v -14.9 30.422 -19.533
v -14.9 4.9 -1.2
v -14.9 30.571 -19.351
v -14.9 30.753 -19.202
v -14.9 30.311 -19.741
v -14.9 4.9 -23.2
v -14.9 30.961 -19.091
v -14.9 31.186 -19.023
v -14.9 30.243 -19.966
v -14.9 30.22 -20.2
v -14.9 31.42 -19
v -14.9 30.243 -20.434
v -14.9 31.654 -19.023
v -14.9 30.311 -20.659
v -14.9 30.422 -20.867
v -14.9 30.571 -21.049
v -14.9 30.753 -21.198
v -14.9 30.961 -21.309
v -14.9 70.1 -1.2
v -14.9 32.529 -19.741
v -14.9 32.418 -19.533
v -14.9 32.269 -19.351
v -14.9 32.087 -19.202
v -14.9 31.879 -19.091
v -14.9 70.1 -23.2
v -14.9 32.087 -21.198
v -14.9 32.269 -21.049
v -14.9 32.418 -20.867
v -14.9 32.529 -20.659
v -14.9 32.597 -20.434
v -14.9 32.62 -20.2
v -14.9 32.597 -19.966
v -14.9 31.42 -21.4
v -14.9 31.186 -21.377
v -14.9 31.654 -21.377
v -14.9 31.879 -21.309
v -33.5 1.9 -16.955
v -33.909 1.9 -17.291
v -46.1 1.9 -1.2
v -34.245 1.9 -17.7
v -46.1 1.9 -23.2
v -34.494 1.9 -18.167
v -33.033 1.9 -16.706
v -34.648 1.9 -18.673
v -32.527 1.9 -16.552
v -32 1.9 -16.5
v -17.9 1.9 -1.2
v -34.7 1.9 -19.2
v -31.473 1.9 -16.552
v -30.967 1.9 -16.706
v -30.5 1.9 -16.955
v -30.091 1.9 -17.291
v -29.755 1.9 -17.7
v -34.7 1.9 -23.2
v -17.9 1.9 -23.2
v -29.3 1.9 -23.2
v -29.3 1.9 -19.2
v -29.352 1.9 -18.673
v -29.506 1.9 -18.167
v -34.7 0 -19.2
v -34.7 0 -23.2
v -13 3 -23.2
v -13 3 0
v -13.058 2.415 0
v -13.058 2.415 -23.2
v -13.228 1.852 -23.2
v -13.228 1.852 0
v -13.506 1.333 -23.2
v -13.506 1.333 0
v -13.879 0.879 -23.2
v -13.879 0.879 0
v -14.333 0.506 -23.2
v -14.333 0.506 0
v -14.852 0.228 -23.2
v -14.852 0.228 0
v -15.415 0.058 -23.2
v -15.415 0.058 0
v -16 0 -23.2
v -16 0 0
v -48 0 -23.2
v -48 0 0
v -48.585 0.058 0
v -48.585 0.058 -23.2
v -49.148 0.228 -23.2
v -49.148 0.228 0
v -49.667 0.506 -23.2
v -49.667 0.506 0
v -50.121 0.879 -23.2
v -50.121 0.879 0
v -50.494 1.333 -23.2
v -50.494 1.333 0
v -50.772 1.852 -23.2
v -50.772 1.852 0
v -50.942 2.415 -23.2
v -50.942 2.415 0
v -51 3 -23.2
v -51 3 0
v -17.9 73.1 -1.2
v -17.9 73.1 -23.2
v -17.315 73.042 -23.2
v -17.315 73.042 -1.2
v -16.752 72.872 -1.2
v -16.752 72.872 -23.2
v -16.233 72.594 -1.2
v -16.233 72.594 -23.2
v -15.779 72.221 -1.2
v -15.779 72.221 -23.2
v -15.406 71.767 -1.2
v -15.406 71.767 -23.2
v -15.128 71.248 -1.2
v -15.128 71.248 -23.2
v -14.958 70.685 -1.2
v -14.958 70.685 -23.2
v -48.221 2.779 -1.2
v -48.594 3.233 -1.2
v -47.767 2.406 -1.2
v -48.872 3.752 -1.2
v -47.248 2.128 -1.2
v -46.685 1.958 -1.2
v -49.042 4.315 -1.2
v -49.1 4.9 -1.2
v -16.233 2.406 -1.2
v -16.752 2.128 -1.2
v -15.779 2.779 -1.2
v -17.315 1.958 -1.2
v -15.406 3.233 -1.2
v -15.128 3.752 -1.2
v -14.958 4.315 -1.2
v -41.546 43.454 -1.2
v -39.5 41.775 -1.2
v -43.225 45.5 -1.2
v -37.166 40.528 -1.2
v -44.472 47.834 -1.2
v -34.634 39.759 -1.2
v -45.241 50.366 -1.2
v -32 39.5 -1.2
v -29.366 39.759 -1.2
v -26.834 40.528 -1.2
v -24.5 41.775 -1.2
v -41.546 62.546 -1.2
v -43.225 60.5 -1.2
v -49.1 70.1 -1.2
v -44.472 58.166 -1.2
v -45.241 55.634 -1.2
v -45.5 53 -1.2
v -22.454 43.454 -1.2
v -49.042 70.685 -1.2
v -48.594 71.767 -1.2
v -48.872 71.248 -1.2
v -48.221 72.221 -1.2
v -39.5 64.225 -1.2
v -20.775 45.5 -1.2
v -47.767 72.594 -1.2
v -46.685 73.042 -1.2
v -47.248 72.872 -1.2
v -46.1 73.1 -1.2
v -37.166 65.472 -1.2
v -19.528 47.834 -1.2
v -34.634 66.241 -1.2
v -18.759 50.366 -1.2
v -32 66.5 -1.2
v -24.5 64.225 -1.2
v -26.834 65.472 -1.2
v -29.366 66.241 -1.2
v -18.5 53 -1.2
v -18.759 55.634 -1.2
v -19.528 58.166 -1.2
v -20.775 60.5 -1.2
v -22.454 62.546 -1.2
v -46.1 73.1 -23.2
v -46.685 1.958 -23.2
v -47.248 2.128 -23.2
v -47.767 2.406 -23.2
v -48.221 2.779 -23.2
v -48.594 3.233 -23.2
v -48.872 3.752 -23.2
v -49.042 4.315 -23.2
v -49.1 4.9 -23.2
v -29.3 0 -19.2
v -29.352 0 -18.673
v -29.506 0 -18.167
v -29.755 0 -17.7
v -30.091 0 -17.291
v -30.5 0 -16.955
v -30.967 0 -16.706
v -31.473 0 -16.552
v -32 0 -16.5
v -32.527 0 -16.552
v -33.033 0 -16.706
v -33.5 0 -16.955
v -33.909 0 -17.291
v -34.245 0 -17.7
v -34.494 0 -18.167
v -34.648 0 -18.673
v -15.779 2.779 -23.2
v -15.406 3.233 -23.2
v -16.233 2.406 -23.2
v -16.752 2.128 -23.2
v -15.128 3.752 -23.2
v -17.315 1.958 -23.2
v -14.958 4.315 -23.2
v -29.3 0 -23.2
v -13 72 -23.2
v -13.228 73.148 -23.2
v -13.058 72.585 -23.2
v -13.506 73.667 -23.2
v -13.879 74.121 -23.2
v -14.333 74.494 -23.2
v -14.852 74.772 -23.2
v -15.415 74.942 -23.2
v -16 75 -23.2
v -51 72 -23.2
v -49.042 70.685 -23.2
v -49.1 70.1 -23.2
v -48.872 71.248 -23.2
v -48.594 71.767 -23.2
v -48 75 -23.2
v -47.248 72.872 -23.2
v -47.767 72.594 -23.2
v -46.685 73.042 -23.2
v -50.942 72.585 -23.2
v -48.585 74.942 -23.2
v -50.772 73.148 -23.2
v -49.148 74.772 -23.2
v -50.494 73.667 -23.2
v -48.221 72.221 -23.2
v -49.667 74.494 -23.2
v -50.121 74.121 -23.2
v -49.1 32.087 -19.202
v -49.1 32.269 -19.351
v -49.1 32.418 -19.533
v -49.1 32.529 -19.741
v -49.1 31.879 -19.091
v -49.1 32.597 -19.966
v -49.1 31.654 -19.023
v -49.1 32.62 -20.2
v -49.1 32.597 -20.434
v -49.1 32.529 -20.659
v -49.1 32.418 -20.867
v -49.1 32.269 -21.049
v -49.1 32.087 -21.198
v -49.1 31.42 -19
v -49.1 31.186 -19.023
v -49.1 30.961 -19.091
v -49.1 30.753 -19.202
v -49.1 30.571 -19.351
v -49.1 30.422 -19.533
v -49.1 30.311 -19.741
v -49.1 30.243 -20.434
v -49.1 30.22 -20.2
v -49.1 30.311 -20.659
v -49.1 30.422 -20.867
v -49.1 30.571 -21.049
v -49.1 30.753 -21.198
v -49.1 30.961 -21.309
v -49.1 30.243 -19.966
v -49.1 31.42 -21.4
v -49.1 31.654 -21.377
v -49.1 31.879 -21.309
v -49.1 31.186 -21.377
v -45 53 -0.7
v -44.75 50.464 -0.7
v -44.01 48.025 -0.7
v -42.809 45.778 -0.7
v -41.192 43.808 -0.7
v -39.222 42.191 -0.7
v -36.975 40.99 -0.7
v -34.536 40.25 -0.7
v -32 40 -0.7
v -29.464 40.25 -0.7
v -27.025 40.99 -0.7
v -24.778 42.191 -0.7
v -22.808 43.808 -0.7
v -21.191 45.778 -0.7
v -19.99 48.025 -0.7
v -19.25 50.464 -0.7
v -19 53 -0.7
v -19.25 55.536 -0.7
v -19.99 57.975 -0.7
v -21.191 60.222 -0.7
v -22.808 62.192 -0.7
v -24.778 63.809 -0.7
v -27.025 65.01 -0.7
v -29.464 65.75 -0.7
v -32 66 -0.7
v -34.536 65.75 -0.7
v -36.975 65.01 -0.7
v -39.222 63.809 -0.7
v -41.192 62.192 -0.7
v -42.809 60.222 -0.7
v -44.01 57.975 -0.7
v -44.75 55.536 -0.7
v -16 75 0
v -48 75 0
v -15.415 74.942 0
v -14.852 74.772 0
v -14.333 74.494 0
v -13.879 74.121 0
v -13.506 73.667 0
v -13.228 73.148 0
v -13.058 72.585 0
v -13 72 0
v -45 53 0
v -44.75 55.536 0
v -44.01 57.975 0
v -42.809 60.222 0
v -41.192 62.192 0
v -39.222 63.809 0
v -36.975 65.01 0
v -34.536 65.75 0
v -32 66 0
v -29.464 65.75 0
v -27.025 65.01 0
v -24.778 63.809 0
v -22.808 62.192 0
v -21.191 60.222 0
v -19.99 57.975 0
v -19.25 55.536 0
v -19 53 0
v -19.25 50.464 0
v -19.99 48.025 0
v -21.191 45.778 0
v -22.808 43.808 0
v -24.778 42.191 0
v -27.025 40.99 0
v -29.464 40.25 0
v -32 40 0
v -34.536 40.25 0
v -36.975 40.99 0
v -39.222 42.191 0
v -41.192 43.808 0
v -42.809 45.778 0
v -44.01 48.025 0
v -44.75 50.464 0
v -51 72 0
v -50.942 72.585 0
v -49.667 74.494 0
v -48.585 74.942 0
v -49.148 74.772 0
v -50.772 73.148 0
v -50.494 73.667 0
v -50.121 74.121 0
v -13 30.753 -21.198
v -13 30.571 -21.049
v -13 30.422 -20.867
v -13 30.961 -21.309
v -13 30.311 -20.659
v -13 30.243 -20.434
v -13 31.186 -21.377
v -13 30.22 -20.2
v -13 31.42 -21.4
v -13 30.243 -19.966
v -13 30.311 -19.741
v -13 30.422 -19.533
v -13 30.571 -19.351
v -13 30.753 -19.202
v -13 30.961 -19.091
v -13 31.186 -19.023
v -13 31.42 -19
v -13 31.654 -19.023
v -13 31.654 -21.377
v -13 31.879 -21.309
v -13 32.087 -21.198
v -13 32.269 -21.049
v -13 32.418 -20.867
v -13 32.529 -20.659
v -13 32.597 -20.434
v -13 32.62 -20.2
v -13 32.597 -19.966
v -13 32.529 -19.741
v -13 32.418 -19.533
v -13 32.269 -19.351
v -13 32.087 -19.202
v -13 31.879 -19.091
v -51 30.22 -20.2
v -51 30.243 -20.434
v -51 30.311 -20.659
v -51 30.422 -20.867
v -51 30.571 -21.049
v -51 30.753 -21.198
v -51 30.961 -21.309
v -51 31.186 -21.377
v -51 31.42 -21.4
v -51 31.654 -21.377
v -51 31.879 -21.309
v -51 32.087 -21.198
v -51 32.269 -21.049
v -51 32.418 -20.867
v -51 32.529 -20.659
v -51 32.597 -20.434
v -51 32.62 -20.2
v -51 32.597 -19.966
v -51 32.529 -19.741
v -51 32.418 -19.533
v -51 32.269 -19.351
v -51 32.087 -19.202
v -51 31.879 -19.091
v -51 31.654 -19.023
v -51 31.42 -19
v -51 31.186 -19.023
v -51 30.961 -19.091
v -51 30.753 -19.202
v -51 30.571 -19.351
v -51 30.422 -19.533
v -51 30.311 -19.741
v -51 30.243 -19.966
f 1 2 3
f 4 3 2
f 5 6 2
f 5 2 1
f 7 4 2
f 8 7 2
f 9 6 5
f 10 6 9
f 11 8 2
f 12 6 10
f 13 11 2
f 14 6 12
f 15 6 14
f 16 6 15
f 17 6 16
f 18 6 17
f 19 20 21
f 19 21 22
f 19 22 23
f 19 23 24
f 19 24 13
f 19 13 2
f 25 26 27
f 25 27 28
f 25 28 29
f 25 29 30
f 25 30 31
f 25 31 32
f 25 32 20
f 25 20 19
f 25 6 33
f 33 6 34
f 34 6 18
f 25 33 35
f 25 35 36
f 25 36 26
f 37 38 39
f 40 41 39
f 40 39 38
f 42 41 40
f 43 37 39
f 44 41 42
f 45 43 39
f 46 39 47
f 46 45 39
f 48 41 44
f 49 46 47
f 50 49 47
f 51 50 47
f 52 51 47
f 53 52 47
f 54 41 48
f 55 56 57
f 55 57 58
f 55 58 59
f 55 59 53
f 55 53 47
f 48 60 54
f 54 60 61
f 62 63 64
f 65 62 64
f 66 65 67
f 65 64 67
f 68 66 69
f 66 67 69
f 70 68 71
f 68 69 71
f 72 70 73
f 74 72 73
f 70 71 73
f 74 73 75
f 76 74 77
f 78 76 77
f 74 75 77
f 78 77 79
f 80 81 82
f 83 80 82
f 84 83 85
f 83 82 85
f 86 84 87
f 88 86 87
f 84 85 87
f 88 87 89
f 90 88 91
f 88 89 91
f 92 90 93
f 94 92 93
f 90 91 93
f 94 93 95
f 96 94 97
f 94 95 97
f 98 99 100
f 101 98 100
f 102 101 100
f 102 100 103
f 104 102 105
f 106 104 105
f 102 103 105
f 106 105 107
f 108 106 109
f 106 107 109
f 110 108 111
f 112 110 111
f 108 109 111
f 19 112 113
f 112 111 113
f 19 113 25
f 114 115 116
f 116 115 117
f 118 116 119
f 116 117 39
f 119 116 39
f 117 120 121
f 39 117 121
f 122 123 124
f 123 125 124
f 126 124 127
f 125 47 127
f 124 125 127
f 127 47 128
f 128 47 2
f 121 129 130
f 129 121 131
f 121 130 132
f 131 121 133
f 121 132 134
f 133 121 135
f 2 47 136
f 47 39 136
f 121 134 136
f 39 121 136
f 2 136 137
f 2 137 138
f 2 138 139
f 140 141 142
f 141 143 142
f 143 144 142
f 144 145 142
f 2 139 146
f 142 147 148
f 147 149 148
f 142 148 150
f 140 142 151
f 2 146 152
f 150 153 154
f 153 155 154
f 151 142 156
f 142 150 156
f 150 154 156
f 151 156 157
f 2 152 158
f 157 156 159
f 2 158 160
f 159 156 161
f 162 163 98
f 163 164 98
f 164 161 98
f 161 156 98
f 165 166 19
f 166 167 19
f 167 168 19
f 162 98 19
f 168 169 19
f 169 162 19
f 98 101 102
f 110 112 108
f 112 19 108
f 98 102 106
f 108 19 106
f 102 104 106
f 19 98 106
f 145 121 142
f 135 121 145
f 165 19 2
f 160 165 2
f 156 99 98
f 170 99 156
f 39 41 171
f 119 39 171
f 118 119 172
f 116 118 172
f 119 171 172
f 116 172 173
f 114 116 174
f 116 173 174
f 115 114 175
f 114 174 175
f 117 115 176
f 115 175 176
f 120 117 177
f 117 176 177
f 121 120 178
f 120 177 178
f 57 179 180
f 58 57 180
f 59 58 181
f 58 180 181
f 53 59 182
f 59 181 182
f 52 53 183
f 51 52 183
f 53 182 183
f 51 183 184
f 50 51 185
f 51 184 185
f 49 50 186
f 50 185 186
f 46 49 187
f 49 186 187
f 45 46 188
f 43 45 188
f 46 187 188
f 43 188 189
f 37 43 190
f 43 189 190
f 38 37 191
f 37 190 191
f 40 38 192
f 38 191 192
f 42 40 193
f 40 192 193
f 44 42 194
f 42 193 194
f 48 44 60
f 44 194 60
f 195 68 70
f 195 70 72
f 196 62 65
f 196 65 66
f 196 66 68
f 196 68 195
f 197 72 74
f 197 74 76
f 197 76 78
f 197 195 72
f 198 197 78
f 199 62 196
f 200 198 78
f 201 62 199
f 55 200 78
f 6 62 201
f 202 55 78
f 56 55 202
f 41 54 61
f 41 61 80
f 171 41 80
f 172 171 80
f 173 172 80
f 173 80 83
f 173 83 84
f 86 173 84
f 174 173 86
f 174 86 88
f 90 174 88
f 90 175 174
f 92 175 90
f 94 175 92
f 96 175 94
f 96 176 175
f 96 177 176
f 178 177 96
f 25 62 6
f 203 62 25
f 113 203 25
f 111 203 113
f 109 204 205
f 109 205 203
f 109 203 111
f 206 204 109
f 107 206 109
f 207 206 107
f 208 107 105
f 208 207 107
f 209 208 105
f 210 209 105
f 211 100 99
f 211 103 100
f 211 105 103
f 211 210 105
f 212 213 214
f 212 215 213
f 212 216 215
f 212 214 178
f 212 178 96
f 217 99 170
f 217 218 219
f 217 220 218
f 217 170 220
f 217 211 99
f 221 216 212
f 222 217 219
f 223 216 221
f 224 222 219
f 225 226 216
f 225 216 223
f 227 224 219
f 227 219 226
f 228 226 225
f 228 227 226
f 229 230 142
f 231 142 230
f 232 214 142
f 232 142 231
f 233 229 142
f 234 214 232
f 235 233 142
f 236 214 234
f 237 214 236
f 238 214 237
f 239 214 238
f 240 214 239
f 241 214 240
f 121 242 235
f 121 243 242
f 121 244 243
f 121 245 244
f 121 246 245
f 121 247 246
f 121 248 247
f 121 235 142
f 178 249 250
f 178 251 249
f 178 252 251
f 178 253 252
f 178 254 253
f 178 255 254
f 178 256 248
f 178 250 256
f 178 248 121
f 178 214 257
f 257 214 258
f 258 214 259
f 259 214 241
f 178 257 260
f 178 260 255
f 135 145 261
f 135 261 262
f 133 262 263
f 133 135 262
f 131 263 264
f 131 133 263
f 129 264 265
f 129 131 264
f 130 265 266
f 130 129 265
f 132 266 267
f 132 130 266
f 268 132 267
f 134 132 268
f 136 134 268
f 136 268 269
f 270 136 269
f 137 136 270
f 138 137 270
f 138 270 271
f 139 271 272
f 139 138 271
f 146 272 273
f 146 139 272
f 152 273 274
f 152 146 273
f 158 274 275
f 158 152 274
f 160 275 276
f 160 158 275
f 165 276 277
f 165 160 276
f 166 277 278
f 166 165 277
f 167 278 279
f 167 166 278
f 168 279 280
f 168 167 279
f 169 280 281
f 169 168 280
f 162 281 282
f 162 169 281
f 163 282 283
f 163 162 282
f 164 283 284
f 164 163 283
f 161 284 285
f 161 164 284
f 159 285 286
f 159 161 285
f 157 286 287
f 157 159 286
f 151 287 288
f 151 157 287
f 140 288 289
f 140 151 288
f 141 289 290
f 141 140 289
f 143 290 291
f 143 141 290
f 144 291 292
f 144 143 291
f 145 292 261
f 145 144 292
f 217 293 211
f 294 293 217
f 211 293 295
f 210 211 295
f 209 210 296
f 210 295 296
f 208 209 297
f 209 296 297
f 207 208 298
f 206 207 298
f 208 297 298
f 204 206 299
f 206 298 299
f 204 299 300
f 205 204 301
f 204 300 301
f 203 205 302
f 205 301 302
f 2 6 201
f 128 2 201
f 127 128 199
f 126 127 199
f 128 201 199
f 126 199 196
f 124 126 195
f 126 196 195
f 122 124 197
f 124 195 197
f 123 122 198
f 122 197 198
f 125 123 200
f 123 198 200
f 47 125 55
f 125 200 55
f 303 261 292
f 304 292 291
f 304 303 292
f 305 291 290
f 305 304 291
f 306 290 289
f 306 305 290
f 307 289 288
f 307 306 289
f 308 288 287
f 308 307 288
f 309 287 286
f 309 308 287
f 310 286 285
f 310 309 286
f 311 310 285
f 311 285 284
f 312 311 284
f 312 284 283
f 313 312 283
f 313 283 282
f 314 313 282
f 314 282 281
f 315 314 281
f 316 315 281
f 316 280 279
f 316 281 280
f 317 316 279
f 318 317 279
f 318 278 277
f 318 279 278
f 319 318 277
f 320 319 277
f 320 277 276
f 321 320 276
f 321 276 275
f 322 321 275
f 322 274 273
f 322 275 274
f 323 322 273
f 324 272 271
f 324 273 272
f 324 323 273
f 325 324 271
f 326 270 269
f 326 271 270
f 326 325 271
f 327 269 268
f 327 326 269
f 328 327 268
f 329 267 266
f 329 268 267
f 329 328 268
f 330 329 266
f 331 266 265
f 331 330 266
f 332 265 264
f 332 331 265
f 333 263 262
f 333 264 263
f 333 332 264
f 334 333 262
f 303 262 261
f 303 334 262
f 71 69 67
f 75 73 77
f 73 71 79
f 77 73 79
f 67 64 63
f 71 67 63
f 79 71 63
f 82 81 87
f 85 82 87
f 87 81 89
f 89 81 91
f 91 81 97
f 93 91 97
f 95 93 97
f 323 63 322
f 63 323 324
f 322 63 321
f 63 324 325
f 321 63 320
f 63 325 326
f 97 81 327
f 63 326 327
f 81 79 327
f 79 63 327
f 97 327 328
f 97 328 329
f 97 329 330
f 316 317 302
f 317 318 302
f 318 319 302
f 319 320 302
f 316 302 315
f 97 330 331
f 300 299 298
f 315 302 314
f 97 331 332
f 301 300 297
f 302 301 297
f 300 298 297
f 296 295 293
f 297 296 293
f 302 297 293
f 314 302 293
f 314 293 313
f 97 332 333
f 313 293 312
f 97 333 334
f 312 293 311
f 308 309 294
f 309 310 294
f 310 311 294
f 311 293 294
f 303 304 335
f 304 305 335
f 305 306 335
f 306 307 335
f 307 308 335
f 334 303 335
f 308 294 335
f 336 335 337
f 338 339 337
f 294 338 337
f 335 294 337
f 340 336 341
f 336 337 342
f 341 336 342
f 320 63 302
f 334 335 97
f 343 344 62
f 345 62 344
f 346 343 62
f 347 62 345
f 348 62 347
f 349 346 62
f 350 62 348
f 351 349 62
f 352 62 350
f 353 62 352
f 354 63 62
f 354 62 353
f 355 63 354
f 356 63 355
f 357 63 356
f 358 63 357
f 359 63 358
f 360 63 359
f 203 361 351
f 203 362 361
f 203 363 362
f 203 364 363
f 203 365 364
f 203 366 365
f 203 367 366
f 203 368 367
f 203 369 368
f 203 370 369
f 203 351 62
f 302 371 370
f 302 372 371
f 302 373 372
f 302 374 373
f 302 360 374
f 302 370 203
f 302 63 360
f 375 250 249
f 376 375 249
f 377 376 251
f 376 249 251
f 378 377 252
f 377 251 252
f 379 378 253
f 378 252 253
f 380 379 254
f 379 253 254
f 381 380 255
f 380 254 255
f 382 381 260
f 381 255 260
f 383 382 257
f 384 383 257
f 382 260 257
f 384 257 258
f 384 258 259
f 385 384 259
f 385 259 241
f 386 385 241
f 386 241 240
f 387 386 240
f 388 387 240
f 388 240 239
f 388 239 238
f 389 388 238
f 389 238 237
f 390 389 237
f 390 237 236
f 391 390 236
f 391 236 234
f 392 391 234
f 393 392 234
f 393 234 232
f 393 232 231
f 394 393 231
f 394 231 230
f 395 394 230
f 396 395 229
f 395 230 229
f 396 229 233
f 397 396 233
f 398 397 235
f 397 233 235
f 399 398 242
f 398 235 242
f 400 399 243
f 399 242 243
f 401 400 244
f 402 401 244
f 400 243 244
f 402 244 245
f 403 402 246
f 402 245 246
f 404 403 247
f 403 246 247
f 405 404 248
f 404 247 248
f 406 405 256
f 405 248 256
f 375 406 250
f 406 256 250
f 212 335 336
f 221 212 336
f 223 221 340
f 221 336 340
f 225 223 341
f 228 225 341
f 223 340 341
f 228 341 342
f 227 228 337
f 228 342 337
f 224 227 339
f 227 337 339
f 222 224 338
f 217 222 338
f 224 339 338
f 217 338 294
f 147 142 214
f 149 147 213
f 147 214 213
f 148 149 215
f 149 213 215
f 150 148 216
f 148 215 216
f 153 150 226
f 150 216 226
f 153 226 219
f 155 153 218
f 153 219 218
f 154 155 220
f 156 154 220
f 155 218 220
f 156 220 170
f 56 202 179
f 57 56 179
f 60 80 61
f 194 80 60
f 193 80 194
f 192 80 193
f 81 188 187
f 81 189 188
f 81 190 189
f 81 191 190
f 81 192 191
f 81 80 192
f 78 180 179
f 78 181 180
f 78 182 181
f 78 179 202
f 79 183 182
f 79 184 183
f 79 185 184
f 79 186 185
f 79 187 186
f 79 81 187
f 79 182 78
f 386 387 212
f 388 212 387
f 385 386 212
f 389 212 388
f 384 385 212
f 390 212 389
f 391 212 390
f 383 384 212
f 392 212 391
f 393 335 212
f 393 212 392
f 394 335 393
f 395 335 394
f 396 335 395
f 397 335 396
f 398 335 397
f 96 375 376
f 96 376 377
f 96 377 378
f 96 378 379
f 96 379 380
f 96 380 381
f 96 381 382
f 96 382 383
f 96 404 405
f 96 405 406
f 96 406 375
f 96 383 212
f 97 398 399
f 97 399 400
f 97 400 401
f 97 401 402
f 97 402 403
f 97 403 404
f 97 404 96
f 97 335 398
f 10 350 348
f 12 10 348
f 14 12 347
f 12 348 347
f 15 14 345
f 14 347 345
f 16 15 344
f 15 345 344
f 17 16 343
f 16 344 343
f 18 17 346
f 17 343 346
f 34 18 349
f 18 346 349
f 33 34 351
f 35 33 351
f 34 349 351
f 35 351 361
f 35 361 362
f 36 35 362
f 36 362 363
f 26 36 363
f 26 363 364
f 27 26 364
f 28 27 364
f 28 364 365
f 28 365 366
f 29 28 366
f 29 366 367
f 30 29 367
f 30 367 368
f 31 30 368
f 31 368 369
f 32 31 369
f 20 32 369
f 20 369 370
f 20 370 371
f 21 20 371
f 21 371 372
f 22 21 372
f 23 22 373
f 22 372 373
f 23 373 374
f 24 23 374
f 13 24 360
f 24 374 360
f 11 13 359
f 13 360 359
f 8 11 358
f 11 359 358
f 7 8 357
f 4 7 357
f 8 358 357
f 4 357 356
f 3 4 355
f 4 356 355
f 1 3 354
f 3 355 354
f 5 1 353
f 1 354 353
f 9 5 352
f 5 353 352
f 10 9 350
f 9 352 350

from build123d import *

# Parameters (mm, degrees)
SKETCH013_R             = 13
PAD007_DEPTH            = 23.2
POCKET006_DEPTH         = 22
CHAMFER_SIZE            = 0.5
POCKET017_DEPTH         = 5
SKETCH055_R             = 1.2
POCKET020012_DEPTH      = 38.001
BODY002_PLACEMENT_ANGLE = 180


with BuildPart() as part:
    # Sketch013 → Pad007 (new body)
    with BuildSketch(Plane.XY):
        with BuildLine():
            ThreePointArc((-48, 75), (-50.12132, 74.12132), (-51, 72))
            Line((-51, 3), (-51, 72))
            ThreePointArc((-51, 3), (-50.12132, 0.87868), (-48, 0))
            Line((-16, 0), (-48, 0))
            ThreePointArc((-16, 0), (-13.87868, 0.87868), (-13, 3))
            Line((-13, 72), (-13, 3))
            ThreePointArc((-13, 72), (-13.87868, 74.12132), (-16, 75))
            Line((-48, 75), (-16, 75))
        make_face()
        with Locations((-32, 53)):
            Circle(SKETCH013_R, mode=Mode.SUBTRACT)
    extrude(amount=PAD007_DEPTH)

    # Sketch014 (on Face11 of Pad007) → Pocket006 (cut)
    with BuildSketch(Plane.XY.offset(23.2)):
        with BuildLine():
            Line((-46.1, 73.1), (-17.9, 73.1))
            ThreePointArc((-14.9, 70.1), (-15.77868, 72.22132), (-17.9, 73.1))
            Line((-14.9, 70.1), (-14.9, 4.9))
            ThreePointArc((-17.9, 1.9), (-15.77868, 2.77868), (-14.9, 4.9))
            Line((-17.9, 1.9), (-46.1, 1.9))
            ThreePointArc((-49.1, 4.9), (-48.22132, 2.77868), (-46.1, 1.9))
            Line((-49.1, 4.9), (-49.1, 70.1))
            ThreePointArc((-46.1, 73.1), (-48.22132, 72.22132), (-49.1, 70.1))
        make_face()
    extrude(amount=-POCKET006_DEPTH, mode=Mode.SUBTRACT)

    # Chamfer
    chamfer_edges = [part.edges().sort_by_distance(p)[0] for p in [
        (-45, 53, 1.2),
    ]]
    chamfer(chamfer_edges, length=CHAMFER_SIZE)

    # Sketch031 → Pocket017 (cut)
    with BuildSketch(Plane.XZ):
        with BuildLine():
            ThreePointArc((-29.3, 25.058865), (-32, 27.758865), (-34.7, 25.058865))
            Line((-34.7, 25.058865), (-34.7, 19.2))
            ThreePointArc((-34.7, 19.2), (-32, 16.5), (-29.3, 19.2))
            Line((-29.3, 19.2), (-29.3, 25.058865))
        make_face()
    extrude(amount=-POCKET017_DEPTH, mode=Mode.SUBTRACT)

    # Sketch055 (on Face6 of Pocket017) → Pocket020012 (cut, through all)
    with BuildSketch(Plane(origin=(-51, 0, 0), x_dir=(0, -1, 0), z_dir=(-1, 0, 0))):
        with Locations((-31.42, 20.2)):
            Circle(SKETCH055_R)
    extrude(amount=-POCKET020012_DEPTH, mode=Mode.SUBTRACT)


with BuildPart() as part_1:
    # Body002 placement: moved
    add(part.part.moved(Location((-64, 0, 0))).rotate(Axis((-64, 0, 0), (0, 1, 0)), BODY002_PLACEMENT_ANGLE))


solid = part_1.part
